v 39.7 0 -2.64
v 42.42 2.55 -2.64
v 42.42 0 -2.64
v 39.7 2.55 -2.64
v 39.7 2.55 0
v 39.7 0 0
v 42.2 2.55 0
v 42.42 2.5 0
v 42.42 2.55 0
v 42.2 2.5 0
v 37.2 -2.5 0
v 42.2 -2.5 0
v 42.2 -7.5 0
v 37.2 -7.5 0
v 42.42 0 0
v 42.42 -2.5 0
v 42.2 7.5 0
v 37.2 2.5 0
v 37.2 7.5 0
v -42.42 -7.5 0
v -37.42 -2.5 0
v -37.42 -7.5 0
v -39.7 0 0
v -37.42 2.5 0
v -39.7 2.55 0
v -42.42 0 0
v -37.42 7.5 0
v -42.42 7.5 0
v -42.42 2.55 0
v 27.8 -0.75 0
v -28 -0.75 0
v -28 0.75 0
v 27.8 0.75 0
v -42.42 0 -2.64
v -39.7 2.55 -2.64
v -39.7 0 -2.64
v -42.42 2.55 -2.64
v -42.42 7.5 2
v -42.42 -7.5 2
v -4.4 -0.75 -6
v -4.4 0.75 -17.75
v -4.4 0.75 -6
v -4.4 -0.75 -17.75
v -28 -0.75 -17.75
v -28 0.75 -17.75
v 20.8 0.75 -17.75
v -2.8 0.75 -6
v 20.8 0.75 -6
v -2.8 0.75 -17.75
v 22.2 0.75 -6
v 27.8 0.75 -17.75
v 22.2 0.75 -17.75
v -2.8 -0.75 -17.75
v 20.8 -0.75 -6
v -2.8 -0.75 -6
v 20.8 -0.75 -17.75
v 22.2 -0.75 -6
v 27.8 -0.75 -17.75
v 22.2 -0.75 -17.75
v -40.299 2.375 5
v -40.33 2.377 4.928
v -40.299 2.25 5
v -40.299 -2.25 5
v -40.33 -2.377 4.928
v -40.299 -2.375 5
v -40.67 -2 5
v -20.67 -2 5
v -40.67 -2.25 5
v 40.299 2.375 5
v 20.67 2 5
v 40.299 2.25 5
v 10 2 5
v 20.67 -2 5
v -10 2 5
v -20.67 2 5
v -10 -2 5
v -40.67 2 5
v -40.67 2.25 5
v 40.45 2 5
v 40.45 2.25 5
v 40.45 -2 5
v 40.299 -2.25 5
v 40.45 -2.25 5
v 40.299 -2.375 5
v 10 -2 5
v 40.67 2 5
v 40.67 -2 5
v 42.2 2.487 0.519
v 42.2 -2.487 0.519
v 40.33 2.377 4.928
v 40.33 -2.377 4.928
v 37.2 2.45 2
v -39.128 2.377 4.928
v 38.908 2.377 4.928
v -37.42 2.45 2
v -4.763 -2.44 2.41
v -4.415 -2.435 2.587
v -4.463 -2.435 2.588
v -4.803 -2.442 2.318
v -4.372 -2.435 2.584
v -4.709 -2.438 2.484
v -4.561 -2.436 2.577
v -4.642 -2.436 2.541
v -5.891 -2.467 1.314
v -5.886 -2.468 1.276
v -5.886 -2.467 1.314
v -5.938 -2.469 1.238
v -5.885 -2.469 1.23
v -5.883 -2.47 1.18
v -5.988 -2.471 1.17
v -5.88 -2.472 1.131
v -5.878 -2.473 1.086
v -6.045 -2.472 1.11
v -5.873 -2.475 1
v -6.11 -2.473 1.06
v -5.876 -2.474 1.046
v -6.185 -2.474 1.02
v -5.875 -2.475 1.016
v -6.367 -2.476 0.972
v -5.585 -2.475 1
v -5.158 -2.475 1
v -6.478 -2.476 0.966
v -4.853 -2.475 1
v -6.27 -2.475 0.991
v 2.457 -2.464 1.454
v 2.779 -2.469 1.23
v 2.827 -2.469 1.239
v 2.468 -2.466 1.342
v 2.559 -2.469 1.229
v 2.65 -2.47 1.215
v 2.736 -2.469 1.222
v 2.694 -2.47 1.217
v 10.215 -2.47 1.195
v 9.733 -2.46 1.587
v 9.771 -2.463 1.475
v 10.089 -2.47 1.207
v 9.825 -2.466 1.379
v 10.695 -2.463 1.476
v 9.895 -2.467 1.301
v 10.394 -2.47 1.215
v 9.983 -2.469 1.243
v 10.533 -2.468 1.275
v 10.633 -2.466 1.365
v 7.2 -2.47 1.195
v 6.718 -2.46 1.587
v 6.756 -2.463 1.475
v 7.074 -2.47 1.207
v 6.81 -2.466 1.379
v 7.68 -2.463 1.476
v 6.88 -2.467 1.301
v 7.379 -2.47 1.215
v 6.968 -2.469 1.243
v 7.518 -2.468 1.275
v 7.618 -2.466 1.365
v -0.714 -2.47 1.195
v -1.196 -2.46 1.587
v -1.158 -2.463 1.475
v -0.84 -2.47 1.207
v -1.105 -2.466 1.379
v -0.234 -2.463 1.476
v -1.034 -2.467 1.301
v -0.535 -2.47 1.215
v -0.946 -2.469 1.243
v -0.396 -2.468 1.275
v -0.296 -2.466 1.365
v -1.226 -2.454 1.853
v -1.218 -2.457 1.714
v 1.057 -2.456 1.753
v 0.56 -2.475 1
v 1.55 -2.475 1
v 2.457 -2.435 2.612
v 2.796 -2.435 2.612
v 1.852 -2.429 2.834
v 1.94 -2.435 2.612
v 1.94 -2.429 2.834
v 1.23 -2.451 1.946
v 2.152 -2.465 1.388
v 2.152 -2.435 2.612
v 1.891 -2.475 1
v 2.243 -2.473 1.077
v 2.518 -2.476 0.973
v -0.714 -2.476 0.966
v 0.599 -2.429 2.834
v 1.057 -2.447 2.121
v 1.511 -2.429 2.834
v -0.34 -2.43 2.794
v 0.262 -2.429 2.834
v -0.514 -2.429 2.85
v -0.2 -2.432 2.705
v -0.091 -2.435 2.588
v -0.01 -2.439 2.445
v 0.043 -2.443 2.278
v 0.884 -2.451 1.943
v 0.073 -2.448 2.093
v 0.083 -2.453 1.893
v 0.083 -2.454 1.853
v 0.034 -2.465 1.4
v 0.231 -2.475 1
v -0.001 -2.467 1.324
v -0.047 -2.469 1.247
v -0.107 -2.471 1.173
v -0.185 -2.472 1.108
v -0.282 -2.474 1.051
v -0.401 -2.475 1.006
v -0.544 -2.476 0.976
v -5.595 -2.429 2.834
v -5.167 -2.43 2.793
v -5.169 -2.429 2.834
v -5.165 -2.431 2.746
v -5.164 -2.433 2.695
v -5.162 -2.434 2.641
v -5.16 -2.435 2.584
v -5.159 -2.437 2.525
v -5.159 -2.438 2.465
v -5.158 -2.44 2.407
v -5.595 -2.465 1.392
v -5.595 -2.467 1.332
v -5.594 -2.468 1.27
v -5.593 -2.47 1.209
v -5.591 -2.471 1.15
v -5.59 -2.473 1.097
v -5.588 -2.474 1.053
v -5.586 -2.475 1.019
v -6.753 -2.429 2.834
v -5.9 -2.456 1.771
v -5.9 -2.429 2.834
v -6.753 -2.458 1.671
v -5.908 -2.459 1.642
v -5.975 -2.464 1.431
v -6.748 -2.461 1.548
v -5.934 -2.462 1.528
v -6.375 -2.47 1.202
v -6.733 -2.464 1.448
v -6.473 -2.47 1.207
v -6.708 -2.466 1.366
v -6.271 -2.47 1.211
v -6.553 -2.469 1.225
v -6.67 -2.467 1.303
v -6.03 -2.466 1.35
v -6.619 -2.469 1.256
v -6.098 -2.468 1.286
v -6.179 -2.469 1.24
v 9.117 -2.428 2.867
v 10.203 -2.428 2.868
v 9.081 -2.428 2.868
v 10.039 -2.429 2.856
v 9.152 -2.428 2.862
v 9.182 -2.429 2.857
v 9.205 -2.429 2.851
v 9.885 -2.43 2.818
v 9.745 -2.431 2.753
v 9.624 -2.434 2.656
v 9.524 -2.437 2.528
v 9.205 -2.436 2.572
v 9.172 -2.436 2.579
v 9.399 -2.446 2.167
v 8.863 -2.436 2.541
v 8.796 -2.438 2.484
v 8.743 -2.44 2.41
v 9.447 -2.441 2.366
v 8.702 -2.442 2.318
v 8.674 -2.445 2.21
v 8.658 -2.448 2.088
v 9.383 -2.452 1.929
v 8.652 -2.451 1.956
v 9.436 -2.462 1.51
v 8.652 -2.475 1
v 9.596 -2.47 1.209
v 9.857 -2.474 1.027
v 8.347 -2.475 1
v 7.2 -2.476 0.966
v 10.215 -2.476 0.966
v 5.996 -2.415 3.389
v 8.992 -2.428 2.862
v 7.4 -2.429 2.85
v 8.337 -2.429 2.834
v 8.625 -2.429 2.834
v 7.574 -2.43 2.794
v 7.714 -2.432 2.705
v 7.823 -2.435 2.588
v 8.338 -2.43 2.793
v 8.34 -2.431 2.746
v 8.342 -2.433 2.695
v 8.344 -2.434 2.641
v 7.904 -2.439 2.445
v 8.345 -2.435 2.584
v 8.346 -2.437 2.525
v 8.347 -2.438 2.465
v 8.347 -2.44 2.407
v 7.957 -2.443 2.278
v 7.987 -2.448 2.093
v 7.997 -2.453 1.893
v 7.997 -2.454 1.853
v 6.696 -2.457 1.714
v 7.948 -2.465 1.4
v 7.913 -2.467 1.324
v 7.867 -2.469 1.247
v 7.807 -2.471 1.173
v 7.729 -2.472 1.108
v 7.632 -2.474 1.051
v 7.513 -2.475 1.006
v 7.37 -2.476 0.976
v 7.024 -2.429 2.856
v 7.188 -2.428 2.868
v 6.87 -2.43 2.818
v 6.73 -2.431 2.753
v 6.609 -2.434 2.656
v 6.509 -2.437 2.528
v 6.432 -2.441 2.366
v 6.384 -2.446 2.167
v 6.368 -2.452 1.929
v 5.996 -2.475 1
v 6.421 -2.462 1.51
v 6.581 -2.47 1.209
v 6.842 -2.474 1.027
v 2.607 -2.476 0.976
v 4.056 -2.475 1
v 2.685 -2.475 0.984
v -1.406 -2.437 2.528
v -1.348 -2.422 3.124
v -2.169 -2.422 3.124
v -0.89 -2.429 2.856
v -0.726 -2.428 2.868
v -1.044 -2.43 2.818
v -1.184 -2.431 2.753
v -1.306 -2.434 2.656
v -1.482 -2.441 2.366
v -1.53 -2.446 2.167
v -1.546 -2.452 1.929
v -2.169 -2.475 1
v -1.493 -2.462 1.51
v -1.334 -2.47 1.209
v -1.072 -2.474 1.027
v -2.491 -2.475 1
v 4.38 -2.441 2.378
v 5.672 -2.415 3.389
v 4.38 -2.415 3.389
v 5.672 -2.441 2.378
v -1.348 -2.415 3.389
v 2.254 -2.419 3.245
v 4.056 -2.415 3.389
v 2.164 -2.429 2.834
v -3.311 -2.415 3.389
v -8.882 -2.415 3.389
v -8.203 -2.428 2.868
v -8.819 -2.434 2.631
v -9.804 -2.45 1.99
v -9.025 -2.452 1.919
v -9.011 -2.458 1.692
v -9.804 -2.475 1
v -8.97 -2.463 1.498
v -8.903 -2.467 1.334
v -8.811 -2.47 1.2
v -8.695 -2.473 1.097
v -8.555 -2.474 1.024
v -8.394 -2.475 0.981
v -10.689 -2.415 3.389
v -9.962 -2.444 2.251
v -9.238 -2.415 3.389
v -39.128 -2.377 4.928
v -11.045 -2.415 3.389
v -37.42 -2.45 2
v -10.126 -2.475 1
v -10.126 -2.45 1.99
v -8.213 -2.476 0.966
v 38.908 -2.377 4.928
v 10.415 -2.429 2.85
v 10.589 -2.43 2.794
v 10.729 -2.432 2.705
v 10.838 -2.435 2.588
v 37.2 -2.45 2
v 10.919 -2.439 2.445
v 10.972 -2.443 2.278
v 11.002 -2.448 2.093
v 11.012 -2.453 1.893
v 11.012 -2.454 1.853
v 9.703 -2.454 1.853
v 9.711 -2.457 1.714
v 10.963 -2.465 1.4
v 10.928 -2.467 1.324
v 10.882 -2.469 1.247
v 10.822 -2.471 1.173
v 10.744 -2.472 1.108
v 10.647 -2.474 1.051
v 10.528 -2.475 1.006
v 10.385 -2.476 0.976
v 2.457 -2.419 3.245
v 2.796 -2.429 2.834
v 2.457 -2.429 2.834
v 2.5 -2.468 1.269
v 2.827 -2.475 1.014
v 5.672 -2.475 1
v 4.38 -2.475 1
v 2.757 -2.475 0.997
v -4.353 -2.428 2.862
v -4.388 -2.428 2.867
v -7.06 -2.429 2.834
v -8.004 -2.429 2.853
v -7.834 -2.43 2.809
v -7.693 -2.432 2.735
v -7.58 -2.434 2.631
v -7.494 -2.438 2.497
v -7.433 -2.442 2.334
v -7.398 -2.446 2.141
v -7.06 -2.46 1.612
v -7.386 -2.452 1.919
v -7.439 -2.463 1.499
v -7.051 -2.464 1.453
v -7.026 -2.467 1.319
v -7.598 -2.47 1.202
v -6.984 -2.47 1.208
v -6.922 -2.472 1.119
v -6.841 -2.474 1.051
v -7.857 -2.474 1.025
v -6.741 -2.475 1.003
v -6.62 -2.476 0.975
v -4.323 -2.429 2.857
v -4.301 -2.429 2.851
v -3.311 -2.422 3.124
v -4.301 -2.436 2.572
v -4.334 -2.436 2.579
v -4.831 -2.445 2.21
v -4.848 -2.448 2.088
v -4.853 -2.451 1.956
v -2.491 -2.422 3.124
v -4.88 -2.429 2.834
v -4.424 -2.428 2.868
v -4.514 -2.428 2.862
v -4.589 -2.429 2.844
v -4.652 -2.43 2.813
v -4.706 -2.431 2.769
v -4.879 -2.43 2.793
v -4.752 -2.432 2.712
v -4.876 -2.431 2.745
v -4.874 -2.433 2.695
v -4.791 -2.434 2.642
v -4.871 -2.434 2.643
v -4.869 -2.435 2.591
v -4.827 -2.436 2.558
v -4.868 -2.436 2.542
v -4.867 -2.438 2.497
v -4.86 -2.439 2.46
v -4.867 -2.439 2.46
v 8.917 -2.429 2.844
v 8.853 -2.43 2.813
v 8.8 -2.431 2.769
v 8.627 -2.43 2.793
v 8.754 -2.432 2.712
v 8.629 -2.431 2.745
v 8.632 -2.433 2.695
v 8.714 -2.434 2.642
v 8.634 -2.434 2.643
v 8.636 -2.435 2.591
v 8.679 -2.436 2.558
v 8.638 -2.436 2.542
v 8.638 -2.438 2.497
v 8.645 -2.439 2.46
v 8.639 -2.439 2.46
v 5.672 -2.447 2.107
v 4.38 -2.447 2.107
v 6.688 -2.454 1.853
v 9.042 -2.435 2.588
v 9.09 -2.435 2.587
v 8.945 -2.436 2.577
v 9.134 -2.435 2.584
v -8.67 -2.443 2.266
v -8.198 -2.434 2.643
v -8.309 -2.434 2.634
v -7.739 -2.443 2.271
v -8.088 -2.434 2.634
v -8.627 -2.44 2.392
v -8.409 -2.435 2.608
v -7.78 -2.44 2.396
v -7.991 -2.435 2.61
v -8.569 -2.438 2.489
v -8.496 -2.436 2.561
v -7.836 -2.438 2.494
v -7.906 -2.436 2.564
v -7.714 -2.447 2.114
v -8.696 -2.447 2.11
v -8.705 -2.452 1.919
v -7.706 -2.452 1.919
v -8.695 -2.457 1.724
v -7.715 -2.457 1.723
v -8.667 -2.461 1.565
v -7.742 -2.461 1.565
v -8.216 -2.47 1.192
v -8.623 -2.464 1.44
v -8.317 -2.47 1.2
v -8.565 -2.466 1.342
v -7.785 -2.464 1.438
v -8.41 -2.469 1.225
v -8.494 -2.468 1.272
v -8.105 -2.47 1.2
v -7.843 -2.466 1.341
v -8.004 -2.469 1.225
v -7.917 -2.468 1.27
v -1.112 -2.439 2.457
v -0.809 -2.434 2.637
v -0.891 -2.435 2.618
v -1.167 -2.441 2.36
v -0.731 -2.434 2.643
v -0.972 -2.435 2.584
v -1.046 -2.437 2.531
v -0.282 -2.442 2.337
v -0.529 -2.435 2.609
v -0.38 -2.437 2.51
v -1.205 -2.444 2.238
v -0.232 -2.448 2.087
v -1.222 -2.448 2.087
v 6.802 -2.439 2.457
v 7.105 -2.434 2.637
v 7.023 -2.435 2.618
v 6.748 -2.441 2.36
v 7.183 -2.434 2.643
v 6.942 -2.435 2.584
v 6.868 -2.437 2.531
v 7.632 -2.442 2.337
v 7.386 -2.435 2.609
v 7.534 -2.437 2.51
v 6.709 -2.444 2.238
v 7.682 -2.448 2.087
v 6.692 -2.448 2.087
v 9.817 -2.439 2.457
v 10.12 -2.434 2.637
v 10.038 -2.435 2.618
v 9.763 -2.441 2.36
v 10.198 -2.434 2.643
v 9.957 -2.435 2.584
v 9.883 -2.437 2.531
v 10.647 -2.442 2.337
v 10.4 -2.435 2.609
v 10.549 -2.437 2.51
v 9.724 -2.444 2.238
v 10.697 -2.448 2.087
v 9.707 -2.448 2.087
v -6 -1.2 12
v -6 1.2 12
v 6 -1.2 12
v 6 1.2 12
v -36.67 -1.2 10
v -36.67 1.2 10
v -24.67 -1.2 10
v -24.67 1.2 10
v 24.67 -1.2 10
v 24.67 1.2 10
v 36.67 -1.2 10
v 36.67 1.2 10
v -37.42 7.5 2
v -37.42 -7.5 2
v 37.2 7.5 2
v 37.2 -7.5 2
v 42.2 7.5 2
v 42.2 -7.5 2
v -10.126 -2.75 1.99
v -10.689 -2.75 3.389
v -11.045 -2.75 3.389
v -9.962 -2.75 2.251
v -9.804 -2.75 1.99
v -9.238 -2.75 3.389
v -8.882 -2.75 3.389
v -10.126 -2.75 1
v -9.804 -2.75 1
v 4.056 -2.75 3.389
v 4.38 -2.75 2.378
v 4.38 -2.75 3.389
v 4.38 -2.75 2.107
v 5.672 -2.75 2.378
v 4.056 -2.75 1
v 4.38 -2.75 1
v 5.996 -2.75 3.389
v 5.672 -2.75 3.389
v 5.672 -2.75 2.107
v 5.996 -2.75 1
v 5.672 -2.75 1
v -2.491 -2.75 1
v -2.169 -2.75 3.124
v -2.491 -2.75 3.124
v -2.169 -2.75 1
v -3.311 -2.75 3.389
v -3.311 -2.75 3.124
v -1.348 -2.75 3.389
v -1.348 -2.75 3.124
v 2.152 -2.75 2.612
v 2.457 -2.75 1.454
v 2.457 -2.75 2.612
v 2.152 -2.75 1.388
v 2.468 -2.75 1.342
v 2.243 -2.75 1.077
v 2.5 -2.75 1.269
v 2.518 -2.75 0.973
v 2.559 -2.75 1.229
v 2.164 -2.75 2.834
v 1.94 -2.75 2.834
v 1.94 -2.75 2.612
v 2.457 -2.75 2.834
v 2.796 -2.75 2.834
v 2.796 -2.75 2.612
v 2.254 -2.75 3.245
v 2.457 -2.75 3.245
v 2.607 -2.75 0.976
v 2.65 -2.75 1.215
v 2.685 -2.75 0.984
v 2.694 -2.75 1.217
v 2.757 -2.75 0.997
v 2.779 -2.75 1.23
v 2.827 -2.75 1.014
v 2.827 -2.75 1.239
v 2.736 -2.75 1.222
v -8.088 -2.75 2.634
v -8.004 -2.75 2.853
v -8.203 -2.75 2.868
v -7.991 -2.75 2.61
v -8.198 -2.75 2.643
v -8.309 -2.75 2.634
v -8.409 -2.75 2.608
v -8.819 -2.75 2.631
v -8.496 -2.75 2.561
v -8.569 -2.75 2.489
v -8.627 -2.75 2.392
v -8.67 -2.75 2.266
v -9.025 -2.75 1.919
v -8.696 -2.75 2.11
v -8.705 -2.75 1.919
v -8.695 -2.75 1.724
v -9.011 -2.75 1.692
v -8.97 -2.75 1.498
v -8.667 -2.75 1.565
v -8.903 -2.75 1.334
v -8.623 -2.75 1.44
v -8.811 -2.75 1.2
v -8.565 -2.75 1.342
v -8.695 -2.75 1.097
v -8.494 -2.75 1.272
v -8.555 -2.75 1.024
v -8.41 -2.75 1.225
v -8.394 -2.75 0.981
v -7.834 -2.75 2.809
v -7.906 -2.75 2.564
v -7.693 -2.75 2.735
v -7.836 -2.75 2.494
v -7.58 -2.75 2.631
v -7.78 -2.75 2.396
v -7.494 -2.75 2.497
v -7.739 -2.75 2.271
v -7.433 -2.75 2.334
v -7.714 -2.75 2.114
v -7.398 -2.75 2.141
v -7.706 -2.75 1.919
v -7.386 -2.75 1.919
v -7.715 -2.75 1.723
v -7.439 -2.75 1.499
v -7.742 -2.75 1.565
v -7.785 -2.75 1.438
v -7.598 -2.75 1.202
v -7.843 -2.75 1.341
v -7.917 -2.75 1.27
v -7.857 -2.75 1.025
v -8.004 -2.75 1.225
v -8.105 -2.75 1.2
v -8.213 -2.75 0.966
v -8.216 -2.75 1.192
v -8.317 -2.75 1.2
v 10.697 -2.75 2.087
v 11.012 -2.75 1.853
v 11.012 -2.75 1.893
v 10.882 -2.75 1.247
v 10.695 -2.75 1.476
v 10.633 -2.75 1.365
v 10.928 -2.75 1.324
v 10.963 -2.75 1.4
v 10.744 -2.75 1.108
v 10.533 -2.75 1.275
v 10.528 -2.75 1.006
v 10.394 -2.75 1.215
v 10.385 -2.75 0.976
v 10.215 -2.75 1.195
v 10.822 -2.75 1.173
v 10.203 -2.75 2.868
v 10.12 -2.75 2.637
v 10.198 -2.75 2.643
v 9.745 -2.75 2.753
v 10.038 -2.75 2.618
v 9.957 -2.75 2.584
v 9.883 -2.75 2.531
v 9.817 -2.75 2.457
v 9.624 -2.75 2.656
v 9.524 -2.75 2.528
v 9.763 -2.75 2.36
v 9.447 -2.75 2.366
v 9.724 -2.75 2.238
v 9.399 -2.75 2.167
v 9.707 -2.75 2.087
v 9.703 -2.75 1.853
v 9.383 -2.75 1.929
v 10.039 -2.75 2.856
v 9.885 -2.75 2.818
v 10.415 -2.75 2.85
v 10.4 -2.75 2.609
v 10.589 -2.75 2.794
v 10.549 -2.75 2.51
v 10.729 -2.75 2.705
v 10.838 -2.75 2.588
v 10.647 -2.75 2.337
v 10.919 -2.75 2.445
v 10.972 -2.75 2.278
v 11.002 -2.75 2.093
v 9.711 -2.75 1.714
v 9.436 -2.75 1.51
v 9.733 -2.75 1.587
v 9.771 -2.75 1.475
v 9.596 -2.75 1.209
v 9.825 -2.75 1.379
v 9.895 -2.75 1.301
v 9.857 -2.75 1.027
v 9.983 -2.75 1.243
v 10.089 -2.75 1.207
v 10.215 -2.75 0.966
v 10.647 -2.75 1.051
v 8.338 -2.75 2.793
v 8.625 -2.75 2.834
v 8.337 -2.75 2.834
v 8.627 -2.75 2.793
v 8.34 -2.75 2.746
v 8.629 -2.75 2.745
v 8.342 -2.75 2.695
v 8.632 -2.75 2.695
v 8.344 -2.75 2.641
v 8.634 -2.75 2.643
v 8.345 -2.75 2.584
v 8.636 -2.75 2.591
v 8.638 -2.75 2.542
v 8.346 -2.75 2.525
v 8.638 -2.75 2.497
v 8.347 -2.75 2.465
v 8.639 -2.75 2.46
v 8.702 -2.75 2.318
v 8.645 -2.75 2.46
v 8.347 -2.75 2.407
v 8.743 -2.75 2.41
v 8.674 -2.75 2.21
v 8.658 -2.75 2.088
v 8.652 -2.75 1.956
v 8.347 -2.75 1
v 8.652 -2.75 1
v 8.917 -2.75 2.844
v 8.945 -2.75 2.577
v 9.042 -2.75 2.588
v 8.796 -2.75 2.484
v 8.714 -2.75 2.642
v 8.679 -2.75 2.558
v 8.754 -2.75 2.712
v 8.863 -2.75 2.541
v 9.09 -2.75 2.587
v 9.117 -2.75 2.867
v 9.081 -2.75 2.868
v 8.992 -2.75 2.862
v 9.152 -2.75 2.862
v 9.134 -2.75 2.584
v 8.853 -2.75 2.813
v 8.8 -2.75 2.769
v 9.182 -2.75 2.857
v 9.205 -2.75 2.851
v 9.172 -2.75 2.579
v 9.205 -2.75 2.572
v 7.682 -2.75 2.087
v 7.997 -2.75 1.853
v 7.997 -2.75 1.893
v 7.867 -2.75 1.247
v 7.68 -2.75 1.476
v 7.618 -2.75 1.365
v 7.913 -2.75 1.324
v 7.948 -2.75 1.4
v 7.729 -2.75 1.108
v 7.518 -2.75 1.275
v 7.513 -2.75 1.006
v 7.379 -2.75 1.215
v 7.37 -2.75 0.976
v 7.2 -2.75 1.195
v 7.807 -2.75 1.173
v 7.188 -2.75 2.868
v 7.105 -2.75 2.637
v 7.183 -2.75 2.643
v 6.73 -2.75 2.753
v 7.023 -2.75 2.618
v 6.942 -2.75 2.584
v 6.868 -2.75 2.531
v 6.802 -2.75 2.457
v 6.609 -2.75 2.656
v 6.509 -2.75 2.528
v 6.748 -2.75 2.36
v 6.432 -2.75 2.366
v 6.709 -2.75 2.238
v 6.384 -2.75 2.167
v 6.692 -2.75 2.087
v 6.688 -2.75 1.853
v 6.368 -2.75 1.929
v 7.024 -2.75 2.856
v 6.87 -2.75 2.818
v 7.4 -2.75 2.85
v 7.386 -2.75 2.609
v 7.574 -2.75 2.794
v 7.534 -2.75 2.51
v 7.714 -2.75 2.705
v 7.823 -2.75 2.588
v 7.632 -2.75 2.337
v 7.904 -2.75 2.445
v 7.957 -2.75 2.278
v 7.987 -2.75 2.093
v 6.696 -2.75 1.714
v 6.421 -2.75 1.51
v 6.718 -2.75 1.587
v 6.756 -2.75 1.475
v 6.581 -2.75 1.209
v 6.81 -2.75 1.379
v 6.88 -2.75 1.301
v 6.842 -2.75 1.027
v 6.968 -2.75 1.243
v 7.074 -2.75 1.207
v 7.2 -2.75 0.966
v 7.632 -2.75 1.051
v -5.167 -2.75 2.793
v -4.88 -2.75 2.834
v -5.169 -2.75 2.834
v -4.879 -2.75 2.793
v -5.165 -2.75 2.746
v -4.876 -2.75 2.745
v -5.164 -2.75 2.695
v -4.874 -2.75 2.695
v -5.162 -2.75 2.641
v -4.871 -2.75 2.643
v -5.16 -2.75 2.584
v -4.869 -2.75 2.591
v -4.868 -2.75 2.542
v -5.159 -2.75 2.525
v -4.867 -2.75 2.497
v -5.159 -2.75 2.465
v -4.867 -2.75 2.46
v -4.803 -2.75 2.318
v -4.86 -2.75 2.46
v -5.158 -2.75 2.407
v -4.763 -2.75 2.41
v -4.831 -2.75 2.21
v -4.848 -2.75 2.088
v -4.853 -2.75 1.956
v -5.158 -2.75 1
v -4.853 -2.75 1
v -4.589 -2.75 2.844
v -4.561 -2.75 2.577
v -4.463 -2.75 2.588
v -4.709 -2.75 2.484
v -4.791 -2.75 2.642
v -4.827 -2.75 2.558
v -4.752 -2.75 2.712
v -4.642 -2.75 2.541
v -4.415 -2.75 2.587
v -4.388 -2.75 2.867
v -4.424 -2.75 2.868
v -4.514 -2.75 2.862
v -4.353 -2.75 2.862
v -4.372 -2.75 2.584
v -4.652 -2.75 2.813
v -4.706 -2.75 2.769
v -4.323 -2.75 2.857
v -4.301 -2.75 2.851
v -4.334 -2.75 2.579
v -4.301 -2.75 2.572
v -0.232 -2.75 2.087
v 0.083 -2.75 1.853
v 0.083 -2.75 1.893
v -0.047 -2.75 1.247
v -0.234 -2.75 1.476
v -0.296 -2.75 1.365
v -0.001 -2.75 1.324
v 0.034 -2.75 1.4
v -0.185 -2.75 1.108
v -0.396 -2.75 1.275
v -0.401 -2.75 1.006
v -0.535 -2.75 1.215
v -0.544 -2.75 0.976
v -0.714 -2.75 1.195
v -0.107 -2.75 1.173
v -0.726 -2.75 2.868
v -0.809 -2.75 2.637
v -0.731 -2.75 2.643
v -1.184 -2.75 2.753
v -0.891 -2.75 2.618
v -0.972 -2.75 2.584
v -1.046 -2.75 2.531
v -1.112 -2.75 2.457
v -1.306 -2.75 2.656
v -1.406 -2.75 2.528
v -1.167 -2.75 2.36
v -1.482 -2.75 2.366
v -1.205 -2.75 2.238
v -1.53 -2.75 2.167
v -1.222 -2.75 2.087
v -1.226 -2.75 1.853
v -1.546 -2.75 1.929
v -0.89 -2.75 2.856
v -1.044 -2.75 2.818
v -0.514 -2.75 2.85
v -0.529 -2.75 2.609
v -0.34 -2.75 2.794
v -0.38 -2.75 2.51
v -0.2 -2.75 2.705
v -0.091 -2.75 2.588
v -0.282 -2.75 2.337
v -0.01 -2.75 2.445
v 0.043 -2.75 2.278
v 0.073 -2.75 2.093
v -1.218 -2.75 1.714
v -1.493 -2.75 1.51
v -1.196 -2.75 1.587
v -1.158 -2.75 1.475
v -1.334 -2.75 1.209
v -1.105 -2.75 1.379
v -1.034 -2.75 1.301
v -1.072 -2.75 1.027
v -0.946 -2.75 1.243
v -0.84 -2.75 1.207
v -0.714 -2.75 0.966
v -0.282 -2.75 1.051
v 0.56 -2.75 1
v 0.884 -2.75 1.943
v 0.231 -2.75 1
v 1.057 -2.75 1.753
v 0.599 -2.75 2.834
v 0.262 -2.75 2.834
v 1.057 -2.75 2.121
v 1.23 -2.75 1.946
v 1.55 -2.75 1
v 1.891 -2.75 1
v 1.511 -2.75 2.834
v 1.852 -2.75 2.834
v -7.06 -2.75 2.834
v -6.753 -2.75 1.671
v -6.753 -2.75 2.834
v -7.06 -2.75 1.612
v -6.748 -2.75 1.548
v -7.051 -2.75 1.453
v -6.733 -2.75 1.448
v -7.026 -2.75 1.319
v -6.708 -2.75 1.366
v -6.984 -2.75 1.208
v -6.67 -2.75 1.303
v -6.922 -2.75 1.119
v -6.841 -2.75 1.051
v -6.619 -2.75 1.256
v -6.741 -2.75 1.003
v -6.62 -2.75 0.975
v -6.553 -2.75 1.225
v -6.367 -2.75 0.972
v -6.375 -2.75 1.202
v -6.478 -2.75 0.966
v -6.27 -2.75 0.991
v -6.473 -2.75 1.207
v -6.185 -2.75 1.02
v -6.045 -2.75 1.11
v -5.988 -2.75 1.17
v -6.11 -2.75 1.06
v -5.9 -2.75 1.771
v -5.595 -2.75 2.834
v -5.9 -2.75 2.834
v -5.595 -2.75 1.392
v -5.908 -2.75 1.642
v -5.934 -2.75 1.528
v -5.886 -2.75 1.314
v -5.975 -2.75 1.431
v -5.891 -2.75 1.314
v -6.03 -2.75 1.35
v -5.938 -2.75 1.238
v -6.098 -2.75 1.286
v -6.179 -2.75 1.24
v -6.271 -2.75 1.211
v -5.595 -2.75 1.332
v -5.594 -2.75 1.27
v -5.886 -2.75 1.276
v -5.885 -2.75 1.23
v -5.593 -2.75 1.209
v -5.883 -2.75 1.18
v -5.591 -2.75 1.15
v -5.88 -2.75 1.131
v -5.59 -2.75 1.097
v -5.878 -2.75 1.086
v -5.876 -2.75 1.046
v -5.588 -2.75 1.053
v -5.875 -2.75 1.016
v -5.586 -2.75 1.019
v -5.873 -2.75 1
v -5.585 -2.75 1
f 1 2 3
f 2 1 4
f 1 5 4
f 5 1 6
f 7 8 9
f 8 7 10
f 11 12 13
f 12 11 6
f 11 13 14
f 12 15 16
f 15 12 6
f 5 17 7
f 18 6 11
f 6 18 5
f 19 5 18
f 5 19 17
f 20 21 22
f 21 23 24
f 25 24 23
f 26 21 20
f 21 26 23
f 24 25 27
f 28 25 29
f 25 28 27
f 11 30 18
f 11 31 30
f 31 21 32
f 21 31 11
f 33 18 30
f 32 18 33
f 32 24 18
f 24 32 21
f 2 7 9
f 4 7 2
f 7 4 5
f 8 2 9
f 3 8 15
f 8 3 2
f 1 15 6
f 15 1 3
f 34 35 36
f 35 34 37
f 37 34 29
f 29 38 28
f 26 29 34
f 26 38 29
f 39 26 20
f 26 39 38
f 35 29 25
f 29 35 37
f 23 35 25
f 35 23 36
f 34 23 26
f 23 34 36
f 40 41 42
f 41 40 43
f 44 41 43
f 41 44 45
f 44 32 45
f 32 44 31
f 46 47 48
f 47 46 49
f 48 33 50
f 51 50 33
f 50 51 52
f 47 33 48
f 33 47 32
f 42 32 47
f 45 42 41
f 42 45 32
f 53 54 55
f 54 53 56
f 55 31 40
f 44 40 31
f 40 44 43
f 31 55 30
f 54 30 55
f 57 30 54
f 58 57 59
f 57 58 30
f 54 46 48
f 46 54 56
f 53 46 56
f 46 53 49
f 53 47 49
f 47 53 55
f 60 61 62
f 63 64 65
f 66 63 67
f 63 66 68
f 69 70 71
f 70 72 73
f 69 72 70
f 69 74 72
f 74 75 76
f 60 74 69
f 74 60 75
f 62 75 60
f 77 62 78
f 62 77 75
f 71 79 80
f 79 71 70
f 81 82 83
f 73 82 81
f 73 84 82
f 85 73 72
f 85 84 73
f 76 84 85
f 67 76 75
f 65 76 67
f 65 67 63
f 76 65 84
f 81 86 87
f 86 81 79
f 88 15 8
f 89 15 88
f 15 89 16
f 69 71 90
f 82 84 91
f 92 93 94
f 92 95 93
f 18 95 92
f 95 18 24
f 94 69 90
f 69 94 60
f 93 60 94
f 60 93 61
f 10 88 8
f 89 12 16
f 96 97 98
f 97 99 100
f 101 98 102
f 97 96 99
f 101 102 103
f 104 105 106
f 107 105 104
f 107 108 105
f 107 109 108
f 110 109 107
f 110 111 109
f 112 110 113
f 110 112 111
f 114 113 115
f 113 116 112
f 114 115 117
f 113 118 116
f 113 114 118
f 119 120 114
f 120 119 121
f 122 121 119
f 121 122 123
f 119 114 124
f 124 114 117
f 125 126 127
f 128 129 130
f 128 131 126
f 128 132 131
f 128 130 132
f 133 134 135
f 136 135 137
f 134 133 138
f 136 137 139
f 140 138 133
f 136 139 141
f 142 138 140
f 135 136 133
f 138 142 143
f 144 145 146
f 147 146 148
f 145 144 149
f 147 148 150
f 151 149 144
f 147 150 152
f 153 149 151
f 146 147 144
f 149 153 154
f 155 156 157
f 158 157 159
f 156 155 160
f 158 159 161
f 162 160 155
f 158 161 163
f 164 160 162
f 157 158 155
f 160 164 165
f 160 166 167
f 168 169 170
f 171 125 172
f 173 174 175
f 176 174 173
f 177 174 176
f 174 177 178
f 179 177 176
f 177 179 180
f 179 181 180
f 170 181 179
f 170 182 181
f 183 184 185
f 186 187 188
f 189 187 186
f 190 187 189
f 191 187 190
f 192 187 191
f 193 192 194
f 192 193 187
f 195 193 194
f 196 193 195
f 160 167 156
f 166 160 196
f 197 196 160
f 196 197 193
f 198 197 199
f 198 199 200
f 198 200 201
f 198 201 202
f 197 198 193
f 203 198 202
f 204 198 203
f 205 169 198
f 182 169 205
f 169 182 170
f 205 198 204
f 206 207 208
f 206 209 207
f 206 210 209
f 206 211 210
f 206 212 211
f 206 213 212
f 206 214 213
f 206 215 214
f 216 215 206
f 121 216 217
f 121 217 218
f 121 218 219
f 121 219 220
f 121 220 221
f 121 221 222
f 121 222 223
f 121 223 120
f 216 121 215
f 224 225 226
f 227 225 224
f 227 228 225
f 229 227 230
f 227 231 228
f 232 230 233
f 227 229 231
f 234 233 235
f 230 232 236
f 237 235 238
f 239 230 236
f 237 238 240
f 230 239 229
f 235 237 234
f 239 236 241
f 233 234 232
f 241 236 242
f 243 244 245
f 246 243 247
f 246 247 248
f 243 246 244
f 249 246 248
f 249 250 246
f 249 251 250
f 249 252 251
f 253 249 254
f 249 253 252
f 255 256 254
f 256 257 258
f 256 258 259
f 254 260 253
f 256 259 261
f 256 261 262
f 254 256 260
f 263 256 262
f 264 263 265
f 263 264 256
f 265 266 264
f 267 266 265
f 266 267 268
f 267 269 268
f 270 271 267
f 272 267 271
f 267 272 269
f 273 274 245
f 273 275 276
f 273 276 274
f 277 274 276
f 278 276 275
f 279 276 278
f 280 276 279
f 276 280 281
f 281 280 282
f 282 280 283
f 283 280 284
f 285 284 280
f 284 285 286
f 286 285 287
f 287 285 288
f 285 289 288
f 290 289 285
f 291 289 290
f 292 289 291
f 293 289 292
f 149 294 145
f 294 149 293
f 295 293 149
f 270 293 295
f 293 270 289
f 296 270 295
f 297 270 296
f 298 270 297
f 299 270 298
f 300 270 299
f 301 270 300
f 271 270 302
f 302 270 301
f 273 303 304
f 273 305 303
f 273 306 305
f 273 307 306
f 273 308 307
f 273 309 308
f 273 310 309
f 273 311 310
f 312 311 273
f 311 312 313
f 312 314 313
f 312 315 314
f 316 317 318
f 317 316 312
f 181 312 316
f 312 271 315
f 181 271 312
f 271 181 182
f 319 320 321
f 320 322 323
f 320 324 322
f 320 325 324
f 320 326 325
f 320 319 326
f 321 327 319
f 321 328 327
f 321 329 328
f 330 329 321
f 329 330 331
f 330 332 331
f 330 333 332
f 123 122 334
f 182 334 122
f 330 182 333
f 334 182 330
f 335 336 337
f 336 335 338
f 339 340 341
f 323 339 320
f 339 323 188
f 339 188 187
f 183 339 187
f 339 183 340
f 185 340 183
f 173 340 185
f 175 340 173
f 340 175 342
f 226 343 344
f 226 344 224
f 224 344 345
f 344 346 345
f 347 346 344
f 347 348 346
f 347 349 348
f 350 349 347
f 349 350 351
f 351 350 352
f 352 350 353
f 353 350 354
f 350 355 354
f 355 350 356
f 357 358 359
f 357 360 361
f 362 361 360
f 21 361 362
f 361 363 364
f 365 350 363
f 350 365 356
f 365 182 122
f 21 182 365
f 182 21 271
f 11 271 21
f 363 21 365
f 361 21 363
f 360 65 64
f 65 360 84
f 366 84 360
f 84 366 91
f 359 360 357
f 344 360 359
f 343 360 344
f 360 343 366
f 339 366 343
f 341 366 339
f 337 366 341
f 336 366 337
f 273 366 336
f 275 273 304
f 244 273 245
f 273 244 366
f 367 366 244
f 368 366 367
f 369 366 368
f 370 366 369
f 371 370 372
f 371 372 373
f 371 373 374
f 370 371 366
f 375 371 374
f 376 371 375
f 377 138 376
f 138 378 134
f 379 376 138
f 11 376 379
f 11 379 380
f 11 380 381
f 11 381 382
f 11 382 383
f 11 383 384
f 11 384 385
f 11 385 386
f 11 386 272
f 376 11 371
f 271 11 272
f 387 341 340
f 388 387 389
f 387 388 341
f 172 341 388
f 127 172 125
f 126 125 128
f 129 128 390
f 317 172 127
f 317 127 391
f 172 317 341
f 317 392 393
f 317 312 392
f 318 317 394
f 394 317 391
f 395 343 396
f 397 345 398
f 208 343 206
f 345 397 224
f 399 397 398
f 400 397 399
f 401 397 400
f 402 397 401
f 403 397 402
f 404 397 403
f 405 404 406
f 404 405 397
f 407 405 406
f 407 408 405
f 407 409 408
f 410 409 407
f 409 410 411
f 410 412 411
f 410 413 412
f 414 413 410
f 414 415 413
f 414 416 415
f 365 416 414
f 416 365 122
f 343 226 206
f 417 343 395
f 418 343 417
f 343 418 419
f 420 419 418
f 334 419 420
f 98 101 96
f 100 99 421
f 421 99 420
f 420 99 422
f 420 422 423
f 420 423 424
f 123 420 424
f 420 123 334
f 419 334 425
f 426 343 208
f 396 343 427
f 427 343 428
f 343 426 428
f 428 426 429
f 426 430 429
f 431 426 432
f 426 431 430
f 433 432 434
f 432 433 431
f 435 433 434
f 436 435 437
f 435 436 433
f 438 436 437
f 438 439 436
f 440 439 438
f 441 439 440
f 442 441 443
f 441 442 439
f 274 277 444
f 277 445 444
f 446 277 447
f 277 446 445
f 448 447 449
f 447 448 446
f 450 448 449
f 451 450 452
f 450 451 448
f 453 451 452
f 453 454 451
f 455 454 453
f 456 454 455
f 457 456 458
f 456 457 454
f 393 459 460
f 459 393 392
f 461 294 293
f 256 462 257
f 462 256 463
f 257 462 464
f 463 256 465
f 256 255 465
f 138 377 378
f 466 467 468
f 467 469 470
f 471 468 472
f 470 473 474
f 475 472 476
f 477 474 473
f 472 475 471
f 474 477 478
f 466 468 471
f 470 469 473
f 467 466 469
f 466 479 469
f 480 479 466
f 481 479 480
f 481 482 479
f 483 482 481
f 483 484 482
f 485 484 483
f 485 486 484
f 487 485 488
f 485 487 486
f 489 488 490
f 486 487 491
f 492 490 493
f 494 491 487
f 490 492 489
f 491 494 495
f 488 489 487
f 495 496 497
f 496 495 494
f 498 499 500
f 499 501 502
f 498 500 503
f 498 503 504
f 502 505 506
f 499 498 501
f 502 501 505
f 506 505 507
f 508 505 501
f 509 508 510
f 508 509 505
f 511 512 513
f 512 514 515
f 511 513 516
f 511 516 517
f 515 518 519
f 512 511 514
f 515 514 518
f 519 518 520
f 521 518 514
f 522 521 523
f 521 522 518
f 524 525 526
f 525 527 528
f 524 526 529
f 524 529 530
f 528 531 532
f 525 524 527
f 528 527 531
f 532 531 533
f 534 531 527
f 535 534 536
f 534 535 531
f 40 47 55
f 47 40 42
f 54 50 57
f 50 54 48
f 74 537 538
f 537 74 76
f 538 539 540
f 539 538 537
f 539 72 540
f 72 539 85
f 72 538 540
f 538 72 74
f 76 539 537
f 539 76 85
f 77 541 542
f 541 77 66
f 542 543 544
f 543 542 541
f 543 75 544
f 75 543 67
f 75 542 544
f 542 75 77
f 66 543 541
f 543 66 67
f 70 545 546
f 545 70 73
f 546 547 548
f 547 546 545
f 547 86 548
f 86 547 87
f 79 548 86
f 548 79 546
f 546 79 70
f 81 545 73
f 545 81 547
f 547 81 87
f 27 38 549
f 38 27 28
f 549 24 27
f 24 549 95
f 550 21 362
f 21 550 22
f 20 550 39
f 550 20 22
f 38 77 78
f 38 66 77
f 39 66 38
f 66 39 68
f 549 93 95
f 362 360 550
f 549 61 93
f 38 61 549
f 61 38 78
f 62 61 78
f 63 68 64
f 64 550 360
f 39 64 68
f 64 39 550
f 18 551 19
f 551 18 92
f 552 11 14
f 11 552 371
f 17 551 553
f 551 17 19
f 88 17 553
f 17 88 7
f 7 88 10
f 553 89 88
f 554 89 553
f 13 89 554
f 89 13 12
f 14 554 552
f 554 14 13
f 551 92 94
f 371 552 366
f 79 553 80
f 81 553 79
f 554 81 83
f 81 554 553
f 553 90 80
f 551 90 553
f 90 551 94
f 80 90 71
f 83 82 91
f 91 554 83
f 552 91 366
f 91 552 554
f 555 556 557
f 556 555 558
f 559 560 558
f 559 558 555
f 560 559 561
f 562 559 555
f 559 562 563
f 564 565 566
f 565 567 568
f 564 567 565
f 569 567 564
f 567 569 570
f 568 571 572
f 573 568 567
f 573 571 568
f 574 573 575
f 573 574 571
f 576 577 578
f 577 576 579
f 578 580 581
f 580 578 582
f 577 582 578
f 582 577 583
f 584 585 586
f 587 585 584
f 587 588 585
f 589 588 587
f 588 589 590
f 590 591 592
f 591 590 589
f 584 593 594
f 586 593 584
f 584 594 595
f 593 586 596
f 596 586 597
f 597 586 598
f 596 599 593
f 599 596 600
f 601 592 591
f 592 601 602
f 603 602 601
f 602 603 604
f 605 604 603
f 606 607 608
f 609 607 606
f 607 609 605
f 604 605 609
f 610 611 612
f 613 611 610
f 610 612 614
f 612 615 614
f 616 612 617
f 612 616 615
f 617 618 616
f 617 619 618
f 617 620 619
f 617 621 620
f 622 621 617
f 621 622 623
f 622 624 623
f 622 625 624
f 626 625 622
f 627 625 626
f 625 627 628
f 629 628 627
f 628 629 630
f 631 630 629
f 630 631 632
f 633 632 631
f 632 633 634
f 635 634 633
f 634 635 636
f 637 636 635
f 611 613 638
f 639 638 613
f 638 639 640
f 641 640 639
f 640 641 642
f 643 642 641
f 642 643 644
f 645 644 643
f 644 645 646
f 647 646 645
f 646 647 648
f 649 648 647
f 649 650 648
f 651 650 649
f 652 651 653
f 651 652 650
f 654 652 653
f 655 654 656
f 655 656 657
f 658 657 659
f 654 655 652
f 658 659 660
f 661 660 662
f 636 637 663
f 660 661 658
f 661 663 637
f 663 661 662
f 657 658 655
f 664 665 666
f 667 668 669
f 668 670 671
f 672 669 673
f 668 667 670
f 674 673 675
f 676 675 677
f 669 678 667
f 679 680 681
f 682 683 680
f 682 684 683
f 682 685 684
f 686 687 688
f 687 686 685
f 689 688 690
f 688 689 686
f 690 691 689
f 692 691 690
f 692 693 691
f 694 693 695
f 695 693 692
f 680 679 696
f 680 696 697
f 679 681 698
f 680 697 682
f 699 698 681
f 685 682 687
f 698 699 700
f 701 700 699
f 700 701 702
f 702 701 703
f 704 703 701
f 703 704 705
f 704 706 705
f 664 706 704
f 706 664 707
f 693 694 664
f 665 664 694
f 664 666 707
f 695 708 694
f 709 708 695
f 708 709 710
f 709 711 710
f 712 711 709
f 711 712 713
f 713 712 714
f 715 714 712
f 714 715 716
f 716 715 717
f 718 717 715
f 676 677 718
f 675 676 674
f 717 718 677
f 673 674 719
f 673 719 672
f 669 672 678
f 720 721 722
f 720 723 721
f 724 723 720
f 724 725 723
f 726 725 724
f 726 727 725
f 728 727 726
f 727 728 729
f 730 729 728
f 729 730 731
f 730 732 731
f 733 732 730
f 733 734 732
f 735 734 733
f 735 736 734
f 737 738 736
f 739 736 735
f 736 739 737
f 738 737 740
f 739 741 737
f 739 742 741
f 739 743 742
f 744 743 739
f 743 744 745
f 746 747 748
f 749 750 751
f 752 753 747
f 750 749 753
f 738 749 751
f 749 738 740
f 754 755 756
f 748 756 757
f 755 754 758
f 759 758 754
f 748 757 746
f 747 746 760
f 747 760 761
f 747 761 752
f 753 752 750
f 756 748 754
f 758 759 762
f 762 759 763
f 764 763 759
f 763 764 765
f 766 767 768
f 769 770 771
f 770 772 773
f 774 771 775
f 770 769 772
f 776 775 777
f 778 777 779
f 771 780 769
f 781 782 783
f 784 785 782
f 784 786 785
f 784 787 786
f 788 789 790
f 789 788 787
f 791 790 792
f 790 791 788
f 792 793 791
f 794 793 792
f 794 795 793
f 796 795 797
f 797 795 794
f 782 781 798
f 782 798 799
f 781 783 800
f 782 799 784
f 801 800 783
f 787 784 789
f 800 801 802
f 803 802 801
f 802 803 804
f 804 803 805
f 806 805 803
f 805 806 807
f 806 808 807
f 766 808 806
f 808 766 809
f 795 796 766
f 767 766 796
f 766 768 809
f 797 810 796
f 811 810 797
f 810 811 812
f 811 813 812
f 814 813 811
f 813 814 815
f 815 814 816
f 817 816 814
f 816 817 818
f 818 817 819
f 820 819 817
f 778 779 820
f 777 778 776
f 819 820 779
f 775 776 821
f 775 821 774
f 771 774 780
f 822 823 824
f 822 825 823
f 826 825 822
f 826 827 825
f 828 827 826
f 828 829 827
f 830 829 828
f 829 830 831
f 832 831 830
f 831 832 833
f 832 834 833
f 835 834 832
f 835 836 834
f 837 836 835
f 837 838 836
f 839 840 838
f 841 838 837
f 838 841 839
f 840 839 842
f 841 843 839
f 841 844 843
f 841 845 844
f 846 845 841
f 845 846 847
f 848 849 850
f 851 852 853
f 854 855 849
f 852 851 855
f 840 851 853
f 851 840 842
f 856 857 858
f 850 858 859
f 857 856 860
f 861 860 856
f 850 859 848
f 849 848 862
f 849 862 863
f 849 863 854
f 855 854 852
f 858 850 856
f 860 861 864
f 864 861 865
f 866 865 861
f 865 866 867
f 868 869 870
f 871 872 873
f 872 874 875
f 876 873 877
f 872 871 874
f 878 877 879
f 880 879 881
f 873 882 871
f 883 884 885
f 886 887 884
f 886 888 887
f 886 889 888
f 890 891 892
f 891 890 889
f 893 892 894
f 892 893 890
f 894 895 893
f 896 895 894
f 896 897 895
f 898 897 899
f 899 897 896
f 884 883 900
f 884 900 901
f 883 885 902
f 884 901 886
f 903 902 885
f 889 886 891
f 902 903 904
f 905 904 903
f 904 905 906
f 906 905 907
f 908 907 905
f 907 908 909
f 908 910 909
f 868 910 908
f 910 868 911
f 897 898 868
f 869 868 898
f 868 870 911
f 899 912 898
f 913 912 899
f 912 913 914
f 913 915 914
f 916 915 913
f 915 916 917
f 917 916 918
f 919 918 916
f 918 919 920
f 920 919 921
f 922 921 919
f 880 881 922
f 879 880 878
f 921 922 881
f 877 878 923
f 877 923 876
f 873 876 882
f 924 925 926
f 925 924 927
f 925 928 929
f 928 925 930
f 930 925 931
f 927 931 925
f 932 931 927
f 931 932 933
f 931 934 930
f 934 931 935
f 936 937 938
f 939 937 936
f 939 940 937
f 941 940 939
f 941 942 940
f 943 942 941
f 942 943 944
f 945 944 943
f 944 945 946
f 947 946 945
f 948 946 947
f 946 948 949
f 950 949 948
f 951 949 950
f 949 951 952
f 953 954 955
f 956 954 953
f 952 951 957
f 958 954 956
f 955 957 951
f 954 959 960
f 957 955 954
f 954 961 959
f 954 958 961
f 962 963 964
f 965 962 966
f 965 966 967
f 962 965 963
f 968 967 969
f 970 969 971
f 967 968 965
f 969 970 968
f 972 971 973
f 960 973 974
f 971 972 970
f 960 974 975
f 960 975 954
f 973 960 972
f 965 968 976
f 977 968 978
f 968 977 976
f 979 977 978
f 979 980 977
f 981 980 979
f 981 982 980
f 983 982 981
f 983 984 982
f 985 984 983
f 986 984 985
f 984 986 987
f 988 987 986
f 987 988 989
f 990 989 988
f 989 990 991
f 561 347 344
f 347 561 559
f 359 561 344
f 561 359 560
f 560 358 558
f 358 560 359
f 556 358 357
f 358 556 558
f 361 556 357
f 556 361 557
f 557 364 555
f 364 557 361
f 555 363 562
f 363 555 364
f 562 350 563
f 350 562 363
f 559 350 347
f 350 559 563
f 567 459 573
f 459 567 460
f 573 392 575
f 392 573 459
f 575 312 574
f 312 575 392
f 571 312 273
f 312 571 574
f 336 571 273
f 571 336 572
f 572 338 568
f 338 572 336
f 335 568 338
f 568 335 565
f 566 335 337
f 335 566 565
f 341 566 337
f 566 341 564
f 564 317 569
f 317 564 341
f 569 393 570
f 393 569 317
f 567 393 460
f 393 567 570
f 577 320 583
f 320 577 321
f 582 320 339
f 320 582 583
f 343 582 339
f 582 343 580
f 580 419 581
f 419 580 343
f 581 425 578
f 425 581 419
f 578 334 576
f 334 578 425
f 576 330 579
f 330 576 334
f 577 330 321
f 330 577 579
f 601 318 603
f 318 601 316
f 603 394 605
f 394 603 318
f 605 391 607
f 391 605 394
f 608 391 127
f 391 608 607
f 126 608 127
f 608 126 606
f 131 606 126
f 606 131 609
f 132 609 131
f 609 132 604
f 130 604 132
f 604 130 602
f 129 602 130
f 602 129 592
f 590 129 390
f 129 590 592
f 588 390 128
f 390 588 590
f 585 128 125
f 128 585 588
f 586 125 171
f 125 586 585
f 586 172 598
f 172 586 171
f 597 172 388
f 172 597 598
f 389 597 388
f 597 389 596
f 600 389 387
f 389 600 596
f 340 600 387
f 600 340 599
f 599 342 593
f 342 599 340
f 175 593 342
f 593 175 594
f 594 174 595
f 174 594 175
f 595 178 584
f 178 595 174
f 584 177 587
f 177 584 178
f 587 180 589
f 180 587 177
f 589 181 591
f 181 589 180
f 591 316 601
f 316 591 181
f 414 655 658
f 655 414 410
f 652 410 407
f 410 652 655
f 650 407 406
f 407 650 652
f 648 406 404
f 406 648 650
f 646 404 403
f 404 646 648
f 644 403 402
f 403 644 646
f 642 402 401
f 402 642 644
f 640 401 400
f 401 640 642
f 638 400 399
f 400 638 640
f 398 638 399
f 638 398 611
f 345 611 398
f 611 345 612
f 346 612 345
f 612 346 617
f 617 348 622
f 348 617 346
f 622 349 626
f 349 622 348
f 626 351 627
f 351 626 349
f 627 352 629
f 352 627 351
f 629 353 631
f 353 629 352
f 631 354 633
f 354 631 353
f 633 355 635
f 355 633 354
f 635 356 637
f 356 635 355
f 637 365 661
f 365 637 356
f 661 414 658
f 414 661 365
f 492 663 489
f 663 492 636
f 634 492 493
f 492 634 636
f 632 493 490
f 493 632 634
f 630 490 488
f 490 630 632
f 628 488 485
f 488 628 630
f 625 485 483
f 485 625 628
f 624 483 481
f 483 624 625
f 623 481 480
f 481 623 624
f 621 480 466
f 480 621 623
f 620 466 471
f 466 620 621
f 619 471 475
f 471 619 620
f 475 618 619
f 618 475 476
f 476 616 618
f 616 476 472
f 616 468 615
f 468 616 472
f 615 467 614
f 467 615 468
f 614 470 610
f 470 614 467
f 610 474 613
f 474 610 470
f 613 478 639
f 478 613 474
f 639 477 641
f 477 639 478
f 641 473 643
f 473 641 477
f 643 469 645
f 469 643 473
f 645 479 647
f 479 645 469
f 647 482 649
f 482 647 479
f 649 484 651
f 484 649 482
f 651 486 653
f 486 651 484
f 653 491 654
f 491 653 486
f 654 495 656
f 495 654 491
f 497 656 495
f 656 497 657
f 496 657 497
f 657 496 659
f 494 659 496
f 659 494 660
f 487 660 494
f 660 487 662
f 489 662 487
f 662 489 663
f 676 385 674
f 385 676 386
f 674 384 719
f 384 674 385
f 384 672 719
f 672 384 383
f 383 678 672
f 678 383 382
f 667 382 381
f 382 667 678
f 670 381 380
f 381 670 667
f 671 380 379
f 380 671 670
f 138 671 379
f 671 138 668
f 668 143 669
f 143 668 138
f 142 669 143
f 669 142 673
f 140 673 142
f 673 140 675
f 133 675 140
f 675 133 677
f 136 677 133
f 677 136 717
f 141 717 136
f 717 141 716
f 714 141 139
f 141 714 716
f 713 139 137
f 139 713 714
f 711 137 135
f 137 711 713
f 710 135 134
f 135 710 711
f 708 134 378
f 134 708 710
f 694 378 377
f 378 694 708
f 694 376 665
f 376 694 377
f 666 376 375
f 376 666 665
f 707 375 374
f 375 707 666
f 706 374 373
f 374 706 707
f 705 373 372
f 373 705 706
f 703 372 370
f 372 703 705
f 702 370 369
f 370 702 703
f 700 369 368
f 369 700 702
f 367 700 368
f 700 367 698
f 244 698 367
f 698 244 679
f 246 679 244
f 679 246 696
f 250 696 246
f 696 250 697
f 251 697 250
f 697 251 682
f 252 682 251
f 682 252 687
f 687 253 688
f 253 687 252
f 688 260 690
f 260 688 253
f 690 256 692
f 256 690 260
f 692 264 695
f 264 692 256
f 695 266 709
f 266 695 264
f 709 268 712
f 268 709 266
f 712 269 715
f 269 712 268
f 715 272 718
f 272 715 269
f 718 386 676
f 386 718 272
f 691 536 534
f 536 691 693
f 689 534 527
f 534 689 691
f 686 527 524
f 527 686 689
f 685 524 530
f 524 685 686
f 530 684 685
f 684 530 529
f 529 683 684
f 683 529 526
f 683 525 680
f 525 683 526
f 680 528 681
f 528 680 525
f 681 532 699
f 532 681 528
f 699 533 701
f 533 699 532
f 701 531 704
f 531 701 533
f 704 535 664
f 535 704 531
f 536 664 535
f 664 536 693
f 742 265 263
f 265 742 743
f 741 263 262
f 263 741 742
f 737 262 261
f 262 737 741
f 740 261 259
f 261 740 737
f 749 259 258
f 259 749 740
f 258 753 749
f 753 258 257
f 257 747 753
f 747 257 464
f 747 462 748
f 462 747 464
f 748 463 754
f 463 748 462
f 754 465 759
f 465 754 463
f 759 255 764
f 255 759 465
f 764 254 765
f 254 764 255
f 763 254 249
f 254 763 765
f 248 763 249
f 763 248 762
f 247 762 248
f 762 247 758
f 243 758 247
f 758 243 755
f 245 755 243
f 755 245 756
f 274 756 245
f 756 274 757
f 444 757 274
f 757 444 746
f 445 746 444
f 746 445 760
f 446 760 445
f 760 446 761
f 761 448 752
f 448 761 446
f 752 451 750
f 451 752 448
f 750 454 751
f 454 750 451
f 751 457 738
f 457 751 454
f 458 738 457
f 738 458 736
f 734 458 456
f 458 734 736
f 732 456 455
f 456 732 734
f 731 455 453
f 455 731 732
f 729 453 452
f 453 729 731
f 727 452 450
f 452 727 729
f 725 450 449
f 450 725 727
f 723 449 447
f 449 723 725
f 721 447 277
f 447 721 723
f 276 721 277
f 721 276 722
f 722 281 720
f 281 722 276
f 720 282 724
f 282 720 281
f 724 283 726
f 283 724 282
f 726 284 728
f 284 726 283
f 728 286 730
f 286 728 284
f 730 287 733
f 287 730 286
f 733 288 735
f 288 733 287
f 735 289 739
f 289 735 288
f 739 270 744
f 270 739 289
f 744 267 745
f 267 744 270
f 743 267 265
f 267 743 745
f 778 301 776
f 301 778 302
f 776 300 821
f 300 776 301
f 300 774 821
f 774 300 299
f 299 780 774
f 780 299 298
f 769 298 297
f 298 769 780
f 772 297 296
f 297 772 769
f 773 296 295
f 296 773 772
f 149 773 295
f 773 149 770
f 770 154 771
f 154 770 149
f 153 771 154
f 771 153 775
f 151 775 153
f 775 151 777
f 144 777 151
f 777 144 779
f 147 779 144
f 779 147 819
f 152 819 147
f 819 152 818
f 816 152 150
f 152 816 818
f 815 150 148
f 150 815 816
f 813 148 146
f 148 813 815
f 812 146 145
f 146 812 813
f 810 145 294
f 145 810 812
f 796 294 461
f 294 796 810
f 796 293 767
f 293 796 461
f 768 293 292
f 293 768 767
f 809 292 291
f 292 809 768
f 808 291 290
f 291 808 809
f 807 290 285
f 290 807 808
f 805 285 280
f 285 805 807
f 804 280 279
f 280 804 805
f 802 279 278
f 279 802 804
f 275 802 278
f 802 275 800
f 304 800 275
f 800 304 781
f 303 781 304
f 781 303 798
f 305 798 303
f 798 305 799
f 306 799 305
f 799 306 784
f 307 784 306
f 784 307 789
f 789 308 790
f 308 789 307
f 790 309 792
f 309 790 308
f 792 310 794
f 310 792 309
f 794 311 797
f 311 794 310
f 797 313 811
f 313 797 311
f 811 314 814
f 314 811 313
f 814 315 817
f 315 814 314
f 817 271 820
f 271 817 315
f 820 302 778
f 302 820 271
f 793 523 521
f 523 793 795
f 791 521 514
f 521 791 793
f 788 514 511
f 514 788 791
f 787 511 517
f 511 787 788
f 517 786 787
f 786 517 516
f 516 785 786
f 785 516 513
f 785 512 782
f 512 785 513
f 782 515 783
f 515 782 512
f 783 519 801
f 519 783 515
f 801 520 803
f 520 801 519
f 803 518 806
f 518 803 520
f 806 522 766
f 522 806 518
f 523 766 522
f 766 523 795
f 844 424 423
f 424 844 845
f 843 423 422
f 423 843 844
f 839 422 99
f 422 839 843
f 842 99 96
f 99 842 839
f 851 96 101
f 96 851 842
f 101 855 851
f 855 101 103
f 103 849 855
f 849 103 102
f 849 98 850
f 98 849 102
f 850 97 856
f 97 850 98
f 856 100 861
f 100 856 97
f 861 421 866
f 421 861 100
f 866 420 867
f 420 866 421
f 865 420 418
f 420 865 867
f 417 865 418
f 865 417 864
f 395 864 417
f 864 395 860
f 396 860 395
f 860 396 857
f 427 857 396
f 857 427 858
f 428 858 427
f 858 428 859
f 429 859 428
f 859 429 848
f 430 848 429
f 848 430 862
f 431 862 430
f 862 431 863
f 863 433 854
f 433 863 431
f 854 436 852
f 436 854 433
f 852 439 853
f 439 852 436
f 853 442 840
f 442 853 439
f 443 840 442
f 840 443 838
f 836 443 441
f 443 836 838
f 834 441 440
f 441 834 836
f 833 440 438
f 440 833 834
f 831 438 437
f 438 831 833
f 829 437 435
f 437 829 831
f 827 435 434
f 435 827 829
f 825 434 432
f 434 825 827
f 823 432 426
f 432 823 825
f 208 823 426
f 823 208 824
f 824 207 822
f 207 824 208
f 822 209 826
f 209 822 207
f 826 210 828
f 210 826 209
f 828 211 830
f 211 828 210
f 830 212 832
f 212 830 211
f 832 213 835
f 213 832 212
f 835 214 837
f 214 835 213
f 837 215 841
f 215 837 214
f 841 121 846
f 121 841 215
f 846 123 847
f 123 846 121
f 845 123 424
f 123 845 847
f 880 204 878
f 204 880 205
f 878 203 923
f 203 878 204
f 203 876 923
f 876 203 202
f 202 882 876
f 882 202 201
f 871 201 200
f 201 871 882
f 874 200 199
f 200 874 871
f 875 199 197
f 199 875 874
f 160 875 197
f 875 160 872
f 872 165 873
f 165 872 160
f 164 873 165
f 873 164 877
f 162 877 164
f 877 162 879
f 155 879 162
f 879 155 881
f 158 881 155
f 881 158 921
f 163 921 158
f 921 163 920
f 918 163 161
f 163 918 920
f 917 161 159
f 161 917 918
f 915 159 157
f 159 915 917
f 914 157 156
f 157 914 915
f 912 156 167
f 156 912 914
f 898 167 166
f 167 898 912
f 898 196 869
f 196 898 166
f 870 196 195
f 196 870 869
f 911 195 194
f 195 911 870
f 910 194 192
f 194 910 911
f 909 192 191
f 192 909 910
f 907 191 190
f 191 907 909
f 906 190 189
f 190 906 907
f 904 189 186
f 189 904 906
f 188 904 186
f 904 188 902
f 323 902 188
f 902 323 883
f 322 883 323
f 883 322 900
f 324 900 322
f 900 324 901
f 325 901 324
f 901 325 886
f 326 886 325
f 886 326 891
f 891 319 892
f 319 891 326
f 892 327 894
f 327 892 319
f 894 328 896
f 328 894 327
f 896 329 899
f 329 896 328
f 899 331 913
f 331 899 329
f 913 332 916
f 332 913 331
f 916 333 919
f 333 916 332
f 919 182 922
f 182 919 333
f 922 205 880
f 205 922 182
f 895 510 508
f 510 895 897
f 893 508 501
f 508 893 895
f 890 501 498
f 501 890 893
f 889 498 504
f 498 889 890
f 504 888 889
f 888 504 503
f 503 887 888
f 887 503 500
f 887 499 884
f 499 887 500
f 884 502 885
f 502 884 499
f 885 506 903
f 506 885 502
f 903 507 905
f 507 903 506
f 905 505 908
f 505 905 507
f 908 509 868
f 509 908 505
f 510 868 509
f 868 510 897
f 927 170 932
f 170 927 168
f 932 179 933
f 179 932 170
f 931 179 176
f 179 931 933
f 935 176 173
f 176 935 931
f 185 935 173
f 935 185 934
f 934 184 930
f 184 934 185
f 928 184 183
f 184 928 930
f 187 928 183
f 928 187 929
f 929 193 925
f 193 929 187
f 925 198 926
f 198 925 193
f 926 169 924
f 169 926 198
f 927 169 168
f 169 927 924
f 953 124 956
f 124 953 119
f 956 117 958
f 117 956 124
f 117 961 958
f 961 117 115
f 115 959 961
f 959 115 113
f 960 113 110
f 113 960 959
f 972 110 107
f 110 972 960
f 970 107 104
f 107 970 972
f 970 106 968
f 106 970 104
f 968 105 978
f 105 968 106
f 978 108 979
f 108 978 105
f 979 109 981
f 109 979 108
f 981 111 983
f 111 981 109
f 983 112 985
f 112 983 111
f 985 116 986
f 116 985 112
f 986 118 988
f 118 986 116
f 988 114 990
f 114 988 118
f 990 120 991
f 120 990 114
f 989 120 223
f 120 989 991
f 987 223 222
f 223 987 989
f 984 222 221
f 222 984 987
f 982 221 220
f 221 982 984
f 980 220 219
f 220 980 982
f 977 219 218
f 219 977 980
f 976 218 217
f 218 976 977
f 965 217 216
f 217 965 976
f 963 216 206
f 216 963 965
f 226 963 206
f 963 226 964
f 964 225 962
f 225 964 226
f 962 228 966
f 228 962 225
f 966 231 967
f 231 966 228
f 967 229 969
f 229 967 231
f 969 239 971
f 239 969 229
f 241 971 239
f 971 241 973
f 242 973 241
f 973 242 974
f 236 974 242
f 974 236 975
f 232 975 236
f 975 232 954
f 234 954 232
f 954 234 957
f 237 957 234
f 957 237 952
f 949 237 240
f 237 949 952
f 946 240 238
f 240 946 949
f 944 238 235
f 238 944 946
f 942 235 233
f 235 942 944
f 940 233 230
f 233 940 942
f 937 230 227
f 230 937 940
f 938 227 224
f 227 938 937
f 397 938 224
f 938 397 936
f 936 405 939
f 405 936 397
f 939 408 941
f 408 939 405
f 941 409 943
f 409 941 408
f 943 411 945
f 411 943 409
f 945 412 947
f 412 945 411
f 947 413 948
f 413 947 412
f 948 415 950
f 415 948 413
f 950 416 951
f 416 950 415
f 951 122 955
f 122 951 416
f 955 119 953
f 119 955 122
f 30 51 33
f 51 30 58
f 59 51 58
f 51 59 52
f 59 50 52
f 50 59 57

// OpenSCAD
echo(version=version());
// Parameters used to generate model (Values are measured in mm)

tooth_count = 2; // Number of wells
tooth_width = 23.6; // Width of each tooth
tooth_thickness = 1.5; // Thickness of each tooth
tooth_gap = 1.6; // Spacing between teeth.
tooth_length = 17.75;  // Length of teeth (measured perpendicular from bottom of support)
text_label = "Your Text Here"; // Label or name you want to appear on the side
tooth_support = 6;// Height of upper support on teeth

// Include square blocks on bottom of support
locking_block_supports = "yes"; // [yes, no]

//Main block of code
union() {

// Primary support bar
    translate([0, 0, 0])
    linear_extrude(height = 5, scale = 0.95)
    square([body_x, body_y], center = true);

// Teeth support
    translate([0, 0, -tooth_support])
    linear_extrude(height = tooth_support)
    square([55, tooth_thickness], center = true);

//Handles
     // Handle Center
        translate([0, 0, body_z])
        linear_extrude(height = 7, scale = 0.6)
        square([20, 4], center = true);
    // Handle left
        translate([(-body_x/2)+11.75, 0, body_z])
        linear_extrude(height = 5, scale = 0.6)
        square([20, 4], center = true);
    // Handle right
        translate([(body_x/2)-11.75, 0, body_z])
        linear_extrude(height = 5, scale = 0.6)
        square([20, 4], center = true);

// Left support square
	// Support base
        translate([(-body_x/2)+2.5, 0, 0])
    	linear_extrude(height = 2)
    	square([5, 15], center = true);
	// Angled Support
        translate([(-body_x/2)+2.5, 0, 2])
        linear_extrude(height = 3, scale = 0.3)
        square([5, 15], center = true);

// Right support square
	// Support base
        translate([(body_x/2)-support_x, 0, 0])
    	linear_extrude(height = 2)
    	square([5, 15], center = true);
    // Angled Support
        translate([(body_x/2)-support_x, 0, 2])
        linear_extrude(height = 3, scale = 0.3)
        square([5, 15], center = true);

// Text placed on body of comb
    logo(text_label);

// Locking Blocks.
	if(locking_block_supports == "yes")
	{

    // Right
        translate([(body_x/2)-support_x, 0, -support_z]) linear_extrude(height = support_z) square([support_x, support_y], center = false);

    // Left
        translate([-body_x/2, 0, -support_z]) linear_extrude(height = support_z) square([support_x, support_y], center = false);
	}

//Teeth
	translate([(tooth_margin-3.6), 0, -tooth_length/2]) union() {
		for(i = [0:tooth_count-1]) {
			translate([i * (tooth_width + tooth_gap), 0, 0])
            color("red")
            cube([tooth_width, tooth_thickness, tooth_length], center=true);
		}
	}
    	translate([25, 0, -tooth_length/2]) union() {
            color("blue")
		for(i = [0:0]) {
			translate([i * (5.6 + tooth_gap), 0, 0])
            cube([5.6, tooth_thickness, tooth_length], center=true);
		}
	}
}

body_x = 84.84;
body_z = 5;
body_y = 5;

support_x = 2.72;
support_y = 2.55;
support_z = 2.64;

tooth_margin = -(((tooth_count-1)*tooth_width)/2+((tooth_count-1)*tooth_gap)/2);

module logo(t, s = 2.5, style = "") {
  translate([0, -body_y/2+.75, 1])
    rotate([90, 0, 0]) color("red")
    linear_extrude(height = 1)
    text(t, size = s, font = str("Liberation Sans", style),  halign = "center");
}
/*
* Customizable Electrophoresis Comb
*
* Copyright (c) 2016 Adm Chrysler
* www.admchrysler.com / chrysler@cornell.edu
* Licensed under the Creative Commons
* Attribution - Non-Commercial - Share Alike license.
*
*/
